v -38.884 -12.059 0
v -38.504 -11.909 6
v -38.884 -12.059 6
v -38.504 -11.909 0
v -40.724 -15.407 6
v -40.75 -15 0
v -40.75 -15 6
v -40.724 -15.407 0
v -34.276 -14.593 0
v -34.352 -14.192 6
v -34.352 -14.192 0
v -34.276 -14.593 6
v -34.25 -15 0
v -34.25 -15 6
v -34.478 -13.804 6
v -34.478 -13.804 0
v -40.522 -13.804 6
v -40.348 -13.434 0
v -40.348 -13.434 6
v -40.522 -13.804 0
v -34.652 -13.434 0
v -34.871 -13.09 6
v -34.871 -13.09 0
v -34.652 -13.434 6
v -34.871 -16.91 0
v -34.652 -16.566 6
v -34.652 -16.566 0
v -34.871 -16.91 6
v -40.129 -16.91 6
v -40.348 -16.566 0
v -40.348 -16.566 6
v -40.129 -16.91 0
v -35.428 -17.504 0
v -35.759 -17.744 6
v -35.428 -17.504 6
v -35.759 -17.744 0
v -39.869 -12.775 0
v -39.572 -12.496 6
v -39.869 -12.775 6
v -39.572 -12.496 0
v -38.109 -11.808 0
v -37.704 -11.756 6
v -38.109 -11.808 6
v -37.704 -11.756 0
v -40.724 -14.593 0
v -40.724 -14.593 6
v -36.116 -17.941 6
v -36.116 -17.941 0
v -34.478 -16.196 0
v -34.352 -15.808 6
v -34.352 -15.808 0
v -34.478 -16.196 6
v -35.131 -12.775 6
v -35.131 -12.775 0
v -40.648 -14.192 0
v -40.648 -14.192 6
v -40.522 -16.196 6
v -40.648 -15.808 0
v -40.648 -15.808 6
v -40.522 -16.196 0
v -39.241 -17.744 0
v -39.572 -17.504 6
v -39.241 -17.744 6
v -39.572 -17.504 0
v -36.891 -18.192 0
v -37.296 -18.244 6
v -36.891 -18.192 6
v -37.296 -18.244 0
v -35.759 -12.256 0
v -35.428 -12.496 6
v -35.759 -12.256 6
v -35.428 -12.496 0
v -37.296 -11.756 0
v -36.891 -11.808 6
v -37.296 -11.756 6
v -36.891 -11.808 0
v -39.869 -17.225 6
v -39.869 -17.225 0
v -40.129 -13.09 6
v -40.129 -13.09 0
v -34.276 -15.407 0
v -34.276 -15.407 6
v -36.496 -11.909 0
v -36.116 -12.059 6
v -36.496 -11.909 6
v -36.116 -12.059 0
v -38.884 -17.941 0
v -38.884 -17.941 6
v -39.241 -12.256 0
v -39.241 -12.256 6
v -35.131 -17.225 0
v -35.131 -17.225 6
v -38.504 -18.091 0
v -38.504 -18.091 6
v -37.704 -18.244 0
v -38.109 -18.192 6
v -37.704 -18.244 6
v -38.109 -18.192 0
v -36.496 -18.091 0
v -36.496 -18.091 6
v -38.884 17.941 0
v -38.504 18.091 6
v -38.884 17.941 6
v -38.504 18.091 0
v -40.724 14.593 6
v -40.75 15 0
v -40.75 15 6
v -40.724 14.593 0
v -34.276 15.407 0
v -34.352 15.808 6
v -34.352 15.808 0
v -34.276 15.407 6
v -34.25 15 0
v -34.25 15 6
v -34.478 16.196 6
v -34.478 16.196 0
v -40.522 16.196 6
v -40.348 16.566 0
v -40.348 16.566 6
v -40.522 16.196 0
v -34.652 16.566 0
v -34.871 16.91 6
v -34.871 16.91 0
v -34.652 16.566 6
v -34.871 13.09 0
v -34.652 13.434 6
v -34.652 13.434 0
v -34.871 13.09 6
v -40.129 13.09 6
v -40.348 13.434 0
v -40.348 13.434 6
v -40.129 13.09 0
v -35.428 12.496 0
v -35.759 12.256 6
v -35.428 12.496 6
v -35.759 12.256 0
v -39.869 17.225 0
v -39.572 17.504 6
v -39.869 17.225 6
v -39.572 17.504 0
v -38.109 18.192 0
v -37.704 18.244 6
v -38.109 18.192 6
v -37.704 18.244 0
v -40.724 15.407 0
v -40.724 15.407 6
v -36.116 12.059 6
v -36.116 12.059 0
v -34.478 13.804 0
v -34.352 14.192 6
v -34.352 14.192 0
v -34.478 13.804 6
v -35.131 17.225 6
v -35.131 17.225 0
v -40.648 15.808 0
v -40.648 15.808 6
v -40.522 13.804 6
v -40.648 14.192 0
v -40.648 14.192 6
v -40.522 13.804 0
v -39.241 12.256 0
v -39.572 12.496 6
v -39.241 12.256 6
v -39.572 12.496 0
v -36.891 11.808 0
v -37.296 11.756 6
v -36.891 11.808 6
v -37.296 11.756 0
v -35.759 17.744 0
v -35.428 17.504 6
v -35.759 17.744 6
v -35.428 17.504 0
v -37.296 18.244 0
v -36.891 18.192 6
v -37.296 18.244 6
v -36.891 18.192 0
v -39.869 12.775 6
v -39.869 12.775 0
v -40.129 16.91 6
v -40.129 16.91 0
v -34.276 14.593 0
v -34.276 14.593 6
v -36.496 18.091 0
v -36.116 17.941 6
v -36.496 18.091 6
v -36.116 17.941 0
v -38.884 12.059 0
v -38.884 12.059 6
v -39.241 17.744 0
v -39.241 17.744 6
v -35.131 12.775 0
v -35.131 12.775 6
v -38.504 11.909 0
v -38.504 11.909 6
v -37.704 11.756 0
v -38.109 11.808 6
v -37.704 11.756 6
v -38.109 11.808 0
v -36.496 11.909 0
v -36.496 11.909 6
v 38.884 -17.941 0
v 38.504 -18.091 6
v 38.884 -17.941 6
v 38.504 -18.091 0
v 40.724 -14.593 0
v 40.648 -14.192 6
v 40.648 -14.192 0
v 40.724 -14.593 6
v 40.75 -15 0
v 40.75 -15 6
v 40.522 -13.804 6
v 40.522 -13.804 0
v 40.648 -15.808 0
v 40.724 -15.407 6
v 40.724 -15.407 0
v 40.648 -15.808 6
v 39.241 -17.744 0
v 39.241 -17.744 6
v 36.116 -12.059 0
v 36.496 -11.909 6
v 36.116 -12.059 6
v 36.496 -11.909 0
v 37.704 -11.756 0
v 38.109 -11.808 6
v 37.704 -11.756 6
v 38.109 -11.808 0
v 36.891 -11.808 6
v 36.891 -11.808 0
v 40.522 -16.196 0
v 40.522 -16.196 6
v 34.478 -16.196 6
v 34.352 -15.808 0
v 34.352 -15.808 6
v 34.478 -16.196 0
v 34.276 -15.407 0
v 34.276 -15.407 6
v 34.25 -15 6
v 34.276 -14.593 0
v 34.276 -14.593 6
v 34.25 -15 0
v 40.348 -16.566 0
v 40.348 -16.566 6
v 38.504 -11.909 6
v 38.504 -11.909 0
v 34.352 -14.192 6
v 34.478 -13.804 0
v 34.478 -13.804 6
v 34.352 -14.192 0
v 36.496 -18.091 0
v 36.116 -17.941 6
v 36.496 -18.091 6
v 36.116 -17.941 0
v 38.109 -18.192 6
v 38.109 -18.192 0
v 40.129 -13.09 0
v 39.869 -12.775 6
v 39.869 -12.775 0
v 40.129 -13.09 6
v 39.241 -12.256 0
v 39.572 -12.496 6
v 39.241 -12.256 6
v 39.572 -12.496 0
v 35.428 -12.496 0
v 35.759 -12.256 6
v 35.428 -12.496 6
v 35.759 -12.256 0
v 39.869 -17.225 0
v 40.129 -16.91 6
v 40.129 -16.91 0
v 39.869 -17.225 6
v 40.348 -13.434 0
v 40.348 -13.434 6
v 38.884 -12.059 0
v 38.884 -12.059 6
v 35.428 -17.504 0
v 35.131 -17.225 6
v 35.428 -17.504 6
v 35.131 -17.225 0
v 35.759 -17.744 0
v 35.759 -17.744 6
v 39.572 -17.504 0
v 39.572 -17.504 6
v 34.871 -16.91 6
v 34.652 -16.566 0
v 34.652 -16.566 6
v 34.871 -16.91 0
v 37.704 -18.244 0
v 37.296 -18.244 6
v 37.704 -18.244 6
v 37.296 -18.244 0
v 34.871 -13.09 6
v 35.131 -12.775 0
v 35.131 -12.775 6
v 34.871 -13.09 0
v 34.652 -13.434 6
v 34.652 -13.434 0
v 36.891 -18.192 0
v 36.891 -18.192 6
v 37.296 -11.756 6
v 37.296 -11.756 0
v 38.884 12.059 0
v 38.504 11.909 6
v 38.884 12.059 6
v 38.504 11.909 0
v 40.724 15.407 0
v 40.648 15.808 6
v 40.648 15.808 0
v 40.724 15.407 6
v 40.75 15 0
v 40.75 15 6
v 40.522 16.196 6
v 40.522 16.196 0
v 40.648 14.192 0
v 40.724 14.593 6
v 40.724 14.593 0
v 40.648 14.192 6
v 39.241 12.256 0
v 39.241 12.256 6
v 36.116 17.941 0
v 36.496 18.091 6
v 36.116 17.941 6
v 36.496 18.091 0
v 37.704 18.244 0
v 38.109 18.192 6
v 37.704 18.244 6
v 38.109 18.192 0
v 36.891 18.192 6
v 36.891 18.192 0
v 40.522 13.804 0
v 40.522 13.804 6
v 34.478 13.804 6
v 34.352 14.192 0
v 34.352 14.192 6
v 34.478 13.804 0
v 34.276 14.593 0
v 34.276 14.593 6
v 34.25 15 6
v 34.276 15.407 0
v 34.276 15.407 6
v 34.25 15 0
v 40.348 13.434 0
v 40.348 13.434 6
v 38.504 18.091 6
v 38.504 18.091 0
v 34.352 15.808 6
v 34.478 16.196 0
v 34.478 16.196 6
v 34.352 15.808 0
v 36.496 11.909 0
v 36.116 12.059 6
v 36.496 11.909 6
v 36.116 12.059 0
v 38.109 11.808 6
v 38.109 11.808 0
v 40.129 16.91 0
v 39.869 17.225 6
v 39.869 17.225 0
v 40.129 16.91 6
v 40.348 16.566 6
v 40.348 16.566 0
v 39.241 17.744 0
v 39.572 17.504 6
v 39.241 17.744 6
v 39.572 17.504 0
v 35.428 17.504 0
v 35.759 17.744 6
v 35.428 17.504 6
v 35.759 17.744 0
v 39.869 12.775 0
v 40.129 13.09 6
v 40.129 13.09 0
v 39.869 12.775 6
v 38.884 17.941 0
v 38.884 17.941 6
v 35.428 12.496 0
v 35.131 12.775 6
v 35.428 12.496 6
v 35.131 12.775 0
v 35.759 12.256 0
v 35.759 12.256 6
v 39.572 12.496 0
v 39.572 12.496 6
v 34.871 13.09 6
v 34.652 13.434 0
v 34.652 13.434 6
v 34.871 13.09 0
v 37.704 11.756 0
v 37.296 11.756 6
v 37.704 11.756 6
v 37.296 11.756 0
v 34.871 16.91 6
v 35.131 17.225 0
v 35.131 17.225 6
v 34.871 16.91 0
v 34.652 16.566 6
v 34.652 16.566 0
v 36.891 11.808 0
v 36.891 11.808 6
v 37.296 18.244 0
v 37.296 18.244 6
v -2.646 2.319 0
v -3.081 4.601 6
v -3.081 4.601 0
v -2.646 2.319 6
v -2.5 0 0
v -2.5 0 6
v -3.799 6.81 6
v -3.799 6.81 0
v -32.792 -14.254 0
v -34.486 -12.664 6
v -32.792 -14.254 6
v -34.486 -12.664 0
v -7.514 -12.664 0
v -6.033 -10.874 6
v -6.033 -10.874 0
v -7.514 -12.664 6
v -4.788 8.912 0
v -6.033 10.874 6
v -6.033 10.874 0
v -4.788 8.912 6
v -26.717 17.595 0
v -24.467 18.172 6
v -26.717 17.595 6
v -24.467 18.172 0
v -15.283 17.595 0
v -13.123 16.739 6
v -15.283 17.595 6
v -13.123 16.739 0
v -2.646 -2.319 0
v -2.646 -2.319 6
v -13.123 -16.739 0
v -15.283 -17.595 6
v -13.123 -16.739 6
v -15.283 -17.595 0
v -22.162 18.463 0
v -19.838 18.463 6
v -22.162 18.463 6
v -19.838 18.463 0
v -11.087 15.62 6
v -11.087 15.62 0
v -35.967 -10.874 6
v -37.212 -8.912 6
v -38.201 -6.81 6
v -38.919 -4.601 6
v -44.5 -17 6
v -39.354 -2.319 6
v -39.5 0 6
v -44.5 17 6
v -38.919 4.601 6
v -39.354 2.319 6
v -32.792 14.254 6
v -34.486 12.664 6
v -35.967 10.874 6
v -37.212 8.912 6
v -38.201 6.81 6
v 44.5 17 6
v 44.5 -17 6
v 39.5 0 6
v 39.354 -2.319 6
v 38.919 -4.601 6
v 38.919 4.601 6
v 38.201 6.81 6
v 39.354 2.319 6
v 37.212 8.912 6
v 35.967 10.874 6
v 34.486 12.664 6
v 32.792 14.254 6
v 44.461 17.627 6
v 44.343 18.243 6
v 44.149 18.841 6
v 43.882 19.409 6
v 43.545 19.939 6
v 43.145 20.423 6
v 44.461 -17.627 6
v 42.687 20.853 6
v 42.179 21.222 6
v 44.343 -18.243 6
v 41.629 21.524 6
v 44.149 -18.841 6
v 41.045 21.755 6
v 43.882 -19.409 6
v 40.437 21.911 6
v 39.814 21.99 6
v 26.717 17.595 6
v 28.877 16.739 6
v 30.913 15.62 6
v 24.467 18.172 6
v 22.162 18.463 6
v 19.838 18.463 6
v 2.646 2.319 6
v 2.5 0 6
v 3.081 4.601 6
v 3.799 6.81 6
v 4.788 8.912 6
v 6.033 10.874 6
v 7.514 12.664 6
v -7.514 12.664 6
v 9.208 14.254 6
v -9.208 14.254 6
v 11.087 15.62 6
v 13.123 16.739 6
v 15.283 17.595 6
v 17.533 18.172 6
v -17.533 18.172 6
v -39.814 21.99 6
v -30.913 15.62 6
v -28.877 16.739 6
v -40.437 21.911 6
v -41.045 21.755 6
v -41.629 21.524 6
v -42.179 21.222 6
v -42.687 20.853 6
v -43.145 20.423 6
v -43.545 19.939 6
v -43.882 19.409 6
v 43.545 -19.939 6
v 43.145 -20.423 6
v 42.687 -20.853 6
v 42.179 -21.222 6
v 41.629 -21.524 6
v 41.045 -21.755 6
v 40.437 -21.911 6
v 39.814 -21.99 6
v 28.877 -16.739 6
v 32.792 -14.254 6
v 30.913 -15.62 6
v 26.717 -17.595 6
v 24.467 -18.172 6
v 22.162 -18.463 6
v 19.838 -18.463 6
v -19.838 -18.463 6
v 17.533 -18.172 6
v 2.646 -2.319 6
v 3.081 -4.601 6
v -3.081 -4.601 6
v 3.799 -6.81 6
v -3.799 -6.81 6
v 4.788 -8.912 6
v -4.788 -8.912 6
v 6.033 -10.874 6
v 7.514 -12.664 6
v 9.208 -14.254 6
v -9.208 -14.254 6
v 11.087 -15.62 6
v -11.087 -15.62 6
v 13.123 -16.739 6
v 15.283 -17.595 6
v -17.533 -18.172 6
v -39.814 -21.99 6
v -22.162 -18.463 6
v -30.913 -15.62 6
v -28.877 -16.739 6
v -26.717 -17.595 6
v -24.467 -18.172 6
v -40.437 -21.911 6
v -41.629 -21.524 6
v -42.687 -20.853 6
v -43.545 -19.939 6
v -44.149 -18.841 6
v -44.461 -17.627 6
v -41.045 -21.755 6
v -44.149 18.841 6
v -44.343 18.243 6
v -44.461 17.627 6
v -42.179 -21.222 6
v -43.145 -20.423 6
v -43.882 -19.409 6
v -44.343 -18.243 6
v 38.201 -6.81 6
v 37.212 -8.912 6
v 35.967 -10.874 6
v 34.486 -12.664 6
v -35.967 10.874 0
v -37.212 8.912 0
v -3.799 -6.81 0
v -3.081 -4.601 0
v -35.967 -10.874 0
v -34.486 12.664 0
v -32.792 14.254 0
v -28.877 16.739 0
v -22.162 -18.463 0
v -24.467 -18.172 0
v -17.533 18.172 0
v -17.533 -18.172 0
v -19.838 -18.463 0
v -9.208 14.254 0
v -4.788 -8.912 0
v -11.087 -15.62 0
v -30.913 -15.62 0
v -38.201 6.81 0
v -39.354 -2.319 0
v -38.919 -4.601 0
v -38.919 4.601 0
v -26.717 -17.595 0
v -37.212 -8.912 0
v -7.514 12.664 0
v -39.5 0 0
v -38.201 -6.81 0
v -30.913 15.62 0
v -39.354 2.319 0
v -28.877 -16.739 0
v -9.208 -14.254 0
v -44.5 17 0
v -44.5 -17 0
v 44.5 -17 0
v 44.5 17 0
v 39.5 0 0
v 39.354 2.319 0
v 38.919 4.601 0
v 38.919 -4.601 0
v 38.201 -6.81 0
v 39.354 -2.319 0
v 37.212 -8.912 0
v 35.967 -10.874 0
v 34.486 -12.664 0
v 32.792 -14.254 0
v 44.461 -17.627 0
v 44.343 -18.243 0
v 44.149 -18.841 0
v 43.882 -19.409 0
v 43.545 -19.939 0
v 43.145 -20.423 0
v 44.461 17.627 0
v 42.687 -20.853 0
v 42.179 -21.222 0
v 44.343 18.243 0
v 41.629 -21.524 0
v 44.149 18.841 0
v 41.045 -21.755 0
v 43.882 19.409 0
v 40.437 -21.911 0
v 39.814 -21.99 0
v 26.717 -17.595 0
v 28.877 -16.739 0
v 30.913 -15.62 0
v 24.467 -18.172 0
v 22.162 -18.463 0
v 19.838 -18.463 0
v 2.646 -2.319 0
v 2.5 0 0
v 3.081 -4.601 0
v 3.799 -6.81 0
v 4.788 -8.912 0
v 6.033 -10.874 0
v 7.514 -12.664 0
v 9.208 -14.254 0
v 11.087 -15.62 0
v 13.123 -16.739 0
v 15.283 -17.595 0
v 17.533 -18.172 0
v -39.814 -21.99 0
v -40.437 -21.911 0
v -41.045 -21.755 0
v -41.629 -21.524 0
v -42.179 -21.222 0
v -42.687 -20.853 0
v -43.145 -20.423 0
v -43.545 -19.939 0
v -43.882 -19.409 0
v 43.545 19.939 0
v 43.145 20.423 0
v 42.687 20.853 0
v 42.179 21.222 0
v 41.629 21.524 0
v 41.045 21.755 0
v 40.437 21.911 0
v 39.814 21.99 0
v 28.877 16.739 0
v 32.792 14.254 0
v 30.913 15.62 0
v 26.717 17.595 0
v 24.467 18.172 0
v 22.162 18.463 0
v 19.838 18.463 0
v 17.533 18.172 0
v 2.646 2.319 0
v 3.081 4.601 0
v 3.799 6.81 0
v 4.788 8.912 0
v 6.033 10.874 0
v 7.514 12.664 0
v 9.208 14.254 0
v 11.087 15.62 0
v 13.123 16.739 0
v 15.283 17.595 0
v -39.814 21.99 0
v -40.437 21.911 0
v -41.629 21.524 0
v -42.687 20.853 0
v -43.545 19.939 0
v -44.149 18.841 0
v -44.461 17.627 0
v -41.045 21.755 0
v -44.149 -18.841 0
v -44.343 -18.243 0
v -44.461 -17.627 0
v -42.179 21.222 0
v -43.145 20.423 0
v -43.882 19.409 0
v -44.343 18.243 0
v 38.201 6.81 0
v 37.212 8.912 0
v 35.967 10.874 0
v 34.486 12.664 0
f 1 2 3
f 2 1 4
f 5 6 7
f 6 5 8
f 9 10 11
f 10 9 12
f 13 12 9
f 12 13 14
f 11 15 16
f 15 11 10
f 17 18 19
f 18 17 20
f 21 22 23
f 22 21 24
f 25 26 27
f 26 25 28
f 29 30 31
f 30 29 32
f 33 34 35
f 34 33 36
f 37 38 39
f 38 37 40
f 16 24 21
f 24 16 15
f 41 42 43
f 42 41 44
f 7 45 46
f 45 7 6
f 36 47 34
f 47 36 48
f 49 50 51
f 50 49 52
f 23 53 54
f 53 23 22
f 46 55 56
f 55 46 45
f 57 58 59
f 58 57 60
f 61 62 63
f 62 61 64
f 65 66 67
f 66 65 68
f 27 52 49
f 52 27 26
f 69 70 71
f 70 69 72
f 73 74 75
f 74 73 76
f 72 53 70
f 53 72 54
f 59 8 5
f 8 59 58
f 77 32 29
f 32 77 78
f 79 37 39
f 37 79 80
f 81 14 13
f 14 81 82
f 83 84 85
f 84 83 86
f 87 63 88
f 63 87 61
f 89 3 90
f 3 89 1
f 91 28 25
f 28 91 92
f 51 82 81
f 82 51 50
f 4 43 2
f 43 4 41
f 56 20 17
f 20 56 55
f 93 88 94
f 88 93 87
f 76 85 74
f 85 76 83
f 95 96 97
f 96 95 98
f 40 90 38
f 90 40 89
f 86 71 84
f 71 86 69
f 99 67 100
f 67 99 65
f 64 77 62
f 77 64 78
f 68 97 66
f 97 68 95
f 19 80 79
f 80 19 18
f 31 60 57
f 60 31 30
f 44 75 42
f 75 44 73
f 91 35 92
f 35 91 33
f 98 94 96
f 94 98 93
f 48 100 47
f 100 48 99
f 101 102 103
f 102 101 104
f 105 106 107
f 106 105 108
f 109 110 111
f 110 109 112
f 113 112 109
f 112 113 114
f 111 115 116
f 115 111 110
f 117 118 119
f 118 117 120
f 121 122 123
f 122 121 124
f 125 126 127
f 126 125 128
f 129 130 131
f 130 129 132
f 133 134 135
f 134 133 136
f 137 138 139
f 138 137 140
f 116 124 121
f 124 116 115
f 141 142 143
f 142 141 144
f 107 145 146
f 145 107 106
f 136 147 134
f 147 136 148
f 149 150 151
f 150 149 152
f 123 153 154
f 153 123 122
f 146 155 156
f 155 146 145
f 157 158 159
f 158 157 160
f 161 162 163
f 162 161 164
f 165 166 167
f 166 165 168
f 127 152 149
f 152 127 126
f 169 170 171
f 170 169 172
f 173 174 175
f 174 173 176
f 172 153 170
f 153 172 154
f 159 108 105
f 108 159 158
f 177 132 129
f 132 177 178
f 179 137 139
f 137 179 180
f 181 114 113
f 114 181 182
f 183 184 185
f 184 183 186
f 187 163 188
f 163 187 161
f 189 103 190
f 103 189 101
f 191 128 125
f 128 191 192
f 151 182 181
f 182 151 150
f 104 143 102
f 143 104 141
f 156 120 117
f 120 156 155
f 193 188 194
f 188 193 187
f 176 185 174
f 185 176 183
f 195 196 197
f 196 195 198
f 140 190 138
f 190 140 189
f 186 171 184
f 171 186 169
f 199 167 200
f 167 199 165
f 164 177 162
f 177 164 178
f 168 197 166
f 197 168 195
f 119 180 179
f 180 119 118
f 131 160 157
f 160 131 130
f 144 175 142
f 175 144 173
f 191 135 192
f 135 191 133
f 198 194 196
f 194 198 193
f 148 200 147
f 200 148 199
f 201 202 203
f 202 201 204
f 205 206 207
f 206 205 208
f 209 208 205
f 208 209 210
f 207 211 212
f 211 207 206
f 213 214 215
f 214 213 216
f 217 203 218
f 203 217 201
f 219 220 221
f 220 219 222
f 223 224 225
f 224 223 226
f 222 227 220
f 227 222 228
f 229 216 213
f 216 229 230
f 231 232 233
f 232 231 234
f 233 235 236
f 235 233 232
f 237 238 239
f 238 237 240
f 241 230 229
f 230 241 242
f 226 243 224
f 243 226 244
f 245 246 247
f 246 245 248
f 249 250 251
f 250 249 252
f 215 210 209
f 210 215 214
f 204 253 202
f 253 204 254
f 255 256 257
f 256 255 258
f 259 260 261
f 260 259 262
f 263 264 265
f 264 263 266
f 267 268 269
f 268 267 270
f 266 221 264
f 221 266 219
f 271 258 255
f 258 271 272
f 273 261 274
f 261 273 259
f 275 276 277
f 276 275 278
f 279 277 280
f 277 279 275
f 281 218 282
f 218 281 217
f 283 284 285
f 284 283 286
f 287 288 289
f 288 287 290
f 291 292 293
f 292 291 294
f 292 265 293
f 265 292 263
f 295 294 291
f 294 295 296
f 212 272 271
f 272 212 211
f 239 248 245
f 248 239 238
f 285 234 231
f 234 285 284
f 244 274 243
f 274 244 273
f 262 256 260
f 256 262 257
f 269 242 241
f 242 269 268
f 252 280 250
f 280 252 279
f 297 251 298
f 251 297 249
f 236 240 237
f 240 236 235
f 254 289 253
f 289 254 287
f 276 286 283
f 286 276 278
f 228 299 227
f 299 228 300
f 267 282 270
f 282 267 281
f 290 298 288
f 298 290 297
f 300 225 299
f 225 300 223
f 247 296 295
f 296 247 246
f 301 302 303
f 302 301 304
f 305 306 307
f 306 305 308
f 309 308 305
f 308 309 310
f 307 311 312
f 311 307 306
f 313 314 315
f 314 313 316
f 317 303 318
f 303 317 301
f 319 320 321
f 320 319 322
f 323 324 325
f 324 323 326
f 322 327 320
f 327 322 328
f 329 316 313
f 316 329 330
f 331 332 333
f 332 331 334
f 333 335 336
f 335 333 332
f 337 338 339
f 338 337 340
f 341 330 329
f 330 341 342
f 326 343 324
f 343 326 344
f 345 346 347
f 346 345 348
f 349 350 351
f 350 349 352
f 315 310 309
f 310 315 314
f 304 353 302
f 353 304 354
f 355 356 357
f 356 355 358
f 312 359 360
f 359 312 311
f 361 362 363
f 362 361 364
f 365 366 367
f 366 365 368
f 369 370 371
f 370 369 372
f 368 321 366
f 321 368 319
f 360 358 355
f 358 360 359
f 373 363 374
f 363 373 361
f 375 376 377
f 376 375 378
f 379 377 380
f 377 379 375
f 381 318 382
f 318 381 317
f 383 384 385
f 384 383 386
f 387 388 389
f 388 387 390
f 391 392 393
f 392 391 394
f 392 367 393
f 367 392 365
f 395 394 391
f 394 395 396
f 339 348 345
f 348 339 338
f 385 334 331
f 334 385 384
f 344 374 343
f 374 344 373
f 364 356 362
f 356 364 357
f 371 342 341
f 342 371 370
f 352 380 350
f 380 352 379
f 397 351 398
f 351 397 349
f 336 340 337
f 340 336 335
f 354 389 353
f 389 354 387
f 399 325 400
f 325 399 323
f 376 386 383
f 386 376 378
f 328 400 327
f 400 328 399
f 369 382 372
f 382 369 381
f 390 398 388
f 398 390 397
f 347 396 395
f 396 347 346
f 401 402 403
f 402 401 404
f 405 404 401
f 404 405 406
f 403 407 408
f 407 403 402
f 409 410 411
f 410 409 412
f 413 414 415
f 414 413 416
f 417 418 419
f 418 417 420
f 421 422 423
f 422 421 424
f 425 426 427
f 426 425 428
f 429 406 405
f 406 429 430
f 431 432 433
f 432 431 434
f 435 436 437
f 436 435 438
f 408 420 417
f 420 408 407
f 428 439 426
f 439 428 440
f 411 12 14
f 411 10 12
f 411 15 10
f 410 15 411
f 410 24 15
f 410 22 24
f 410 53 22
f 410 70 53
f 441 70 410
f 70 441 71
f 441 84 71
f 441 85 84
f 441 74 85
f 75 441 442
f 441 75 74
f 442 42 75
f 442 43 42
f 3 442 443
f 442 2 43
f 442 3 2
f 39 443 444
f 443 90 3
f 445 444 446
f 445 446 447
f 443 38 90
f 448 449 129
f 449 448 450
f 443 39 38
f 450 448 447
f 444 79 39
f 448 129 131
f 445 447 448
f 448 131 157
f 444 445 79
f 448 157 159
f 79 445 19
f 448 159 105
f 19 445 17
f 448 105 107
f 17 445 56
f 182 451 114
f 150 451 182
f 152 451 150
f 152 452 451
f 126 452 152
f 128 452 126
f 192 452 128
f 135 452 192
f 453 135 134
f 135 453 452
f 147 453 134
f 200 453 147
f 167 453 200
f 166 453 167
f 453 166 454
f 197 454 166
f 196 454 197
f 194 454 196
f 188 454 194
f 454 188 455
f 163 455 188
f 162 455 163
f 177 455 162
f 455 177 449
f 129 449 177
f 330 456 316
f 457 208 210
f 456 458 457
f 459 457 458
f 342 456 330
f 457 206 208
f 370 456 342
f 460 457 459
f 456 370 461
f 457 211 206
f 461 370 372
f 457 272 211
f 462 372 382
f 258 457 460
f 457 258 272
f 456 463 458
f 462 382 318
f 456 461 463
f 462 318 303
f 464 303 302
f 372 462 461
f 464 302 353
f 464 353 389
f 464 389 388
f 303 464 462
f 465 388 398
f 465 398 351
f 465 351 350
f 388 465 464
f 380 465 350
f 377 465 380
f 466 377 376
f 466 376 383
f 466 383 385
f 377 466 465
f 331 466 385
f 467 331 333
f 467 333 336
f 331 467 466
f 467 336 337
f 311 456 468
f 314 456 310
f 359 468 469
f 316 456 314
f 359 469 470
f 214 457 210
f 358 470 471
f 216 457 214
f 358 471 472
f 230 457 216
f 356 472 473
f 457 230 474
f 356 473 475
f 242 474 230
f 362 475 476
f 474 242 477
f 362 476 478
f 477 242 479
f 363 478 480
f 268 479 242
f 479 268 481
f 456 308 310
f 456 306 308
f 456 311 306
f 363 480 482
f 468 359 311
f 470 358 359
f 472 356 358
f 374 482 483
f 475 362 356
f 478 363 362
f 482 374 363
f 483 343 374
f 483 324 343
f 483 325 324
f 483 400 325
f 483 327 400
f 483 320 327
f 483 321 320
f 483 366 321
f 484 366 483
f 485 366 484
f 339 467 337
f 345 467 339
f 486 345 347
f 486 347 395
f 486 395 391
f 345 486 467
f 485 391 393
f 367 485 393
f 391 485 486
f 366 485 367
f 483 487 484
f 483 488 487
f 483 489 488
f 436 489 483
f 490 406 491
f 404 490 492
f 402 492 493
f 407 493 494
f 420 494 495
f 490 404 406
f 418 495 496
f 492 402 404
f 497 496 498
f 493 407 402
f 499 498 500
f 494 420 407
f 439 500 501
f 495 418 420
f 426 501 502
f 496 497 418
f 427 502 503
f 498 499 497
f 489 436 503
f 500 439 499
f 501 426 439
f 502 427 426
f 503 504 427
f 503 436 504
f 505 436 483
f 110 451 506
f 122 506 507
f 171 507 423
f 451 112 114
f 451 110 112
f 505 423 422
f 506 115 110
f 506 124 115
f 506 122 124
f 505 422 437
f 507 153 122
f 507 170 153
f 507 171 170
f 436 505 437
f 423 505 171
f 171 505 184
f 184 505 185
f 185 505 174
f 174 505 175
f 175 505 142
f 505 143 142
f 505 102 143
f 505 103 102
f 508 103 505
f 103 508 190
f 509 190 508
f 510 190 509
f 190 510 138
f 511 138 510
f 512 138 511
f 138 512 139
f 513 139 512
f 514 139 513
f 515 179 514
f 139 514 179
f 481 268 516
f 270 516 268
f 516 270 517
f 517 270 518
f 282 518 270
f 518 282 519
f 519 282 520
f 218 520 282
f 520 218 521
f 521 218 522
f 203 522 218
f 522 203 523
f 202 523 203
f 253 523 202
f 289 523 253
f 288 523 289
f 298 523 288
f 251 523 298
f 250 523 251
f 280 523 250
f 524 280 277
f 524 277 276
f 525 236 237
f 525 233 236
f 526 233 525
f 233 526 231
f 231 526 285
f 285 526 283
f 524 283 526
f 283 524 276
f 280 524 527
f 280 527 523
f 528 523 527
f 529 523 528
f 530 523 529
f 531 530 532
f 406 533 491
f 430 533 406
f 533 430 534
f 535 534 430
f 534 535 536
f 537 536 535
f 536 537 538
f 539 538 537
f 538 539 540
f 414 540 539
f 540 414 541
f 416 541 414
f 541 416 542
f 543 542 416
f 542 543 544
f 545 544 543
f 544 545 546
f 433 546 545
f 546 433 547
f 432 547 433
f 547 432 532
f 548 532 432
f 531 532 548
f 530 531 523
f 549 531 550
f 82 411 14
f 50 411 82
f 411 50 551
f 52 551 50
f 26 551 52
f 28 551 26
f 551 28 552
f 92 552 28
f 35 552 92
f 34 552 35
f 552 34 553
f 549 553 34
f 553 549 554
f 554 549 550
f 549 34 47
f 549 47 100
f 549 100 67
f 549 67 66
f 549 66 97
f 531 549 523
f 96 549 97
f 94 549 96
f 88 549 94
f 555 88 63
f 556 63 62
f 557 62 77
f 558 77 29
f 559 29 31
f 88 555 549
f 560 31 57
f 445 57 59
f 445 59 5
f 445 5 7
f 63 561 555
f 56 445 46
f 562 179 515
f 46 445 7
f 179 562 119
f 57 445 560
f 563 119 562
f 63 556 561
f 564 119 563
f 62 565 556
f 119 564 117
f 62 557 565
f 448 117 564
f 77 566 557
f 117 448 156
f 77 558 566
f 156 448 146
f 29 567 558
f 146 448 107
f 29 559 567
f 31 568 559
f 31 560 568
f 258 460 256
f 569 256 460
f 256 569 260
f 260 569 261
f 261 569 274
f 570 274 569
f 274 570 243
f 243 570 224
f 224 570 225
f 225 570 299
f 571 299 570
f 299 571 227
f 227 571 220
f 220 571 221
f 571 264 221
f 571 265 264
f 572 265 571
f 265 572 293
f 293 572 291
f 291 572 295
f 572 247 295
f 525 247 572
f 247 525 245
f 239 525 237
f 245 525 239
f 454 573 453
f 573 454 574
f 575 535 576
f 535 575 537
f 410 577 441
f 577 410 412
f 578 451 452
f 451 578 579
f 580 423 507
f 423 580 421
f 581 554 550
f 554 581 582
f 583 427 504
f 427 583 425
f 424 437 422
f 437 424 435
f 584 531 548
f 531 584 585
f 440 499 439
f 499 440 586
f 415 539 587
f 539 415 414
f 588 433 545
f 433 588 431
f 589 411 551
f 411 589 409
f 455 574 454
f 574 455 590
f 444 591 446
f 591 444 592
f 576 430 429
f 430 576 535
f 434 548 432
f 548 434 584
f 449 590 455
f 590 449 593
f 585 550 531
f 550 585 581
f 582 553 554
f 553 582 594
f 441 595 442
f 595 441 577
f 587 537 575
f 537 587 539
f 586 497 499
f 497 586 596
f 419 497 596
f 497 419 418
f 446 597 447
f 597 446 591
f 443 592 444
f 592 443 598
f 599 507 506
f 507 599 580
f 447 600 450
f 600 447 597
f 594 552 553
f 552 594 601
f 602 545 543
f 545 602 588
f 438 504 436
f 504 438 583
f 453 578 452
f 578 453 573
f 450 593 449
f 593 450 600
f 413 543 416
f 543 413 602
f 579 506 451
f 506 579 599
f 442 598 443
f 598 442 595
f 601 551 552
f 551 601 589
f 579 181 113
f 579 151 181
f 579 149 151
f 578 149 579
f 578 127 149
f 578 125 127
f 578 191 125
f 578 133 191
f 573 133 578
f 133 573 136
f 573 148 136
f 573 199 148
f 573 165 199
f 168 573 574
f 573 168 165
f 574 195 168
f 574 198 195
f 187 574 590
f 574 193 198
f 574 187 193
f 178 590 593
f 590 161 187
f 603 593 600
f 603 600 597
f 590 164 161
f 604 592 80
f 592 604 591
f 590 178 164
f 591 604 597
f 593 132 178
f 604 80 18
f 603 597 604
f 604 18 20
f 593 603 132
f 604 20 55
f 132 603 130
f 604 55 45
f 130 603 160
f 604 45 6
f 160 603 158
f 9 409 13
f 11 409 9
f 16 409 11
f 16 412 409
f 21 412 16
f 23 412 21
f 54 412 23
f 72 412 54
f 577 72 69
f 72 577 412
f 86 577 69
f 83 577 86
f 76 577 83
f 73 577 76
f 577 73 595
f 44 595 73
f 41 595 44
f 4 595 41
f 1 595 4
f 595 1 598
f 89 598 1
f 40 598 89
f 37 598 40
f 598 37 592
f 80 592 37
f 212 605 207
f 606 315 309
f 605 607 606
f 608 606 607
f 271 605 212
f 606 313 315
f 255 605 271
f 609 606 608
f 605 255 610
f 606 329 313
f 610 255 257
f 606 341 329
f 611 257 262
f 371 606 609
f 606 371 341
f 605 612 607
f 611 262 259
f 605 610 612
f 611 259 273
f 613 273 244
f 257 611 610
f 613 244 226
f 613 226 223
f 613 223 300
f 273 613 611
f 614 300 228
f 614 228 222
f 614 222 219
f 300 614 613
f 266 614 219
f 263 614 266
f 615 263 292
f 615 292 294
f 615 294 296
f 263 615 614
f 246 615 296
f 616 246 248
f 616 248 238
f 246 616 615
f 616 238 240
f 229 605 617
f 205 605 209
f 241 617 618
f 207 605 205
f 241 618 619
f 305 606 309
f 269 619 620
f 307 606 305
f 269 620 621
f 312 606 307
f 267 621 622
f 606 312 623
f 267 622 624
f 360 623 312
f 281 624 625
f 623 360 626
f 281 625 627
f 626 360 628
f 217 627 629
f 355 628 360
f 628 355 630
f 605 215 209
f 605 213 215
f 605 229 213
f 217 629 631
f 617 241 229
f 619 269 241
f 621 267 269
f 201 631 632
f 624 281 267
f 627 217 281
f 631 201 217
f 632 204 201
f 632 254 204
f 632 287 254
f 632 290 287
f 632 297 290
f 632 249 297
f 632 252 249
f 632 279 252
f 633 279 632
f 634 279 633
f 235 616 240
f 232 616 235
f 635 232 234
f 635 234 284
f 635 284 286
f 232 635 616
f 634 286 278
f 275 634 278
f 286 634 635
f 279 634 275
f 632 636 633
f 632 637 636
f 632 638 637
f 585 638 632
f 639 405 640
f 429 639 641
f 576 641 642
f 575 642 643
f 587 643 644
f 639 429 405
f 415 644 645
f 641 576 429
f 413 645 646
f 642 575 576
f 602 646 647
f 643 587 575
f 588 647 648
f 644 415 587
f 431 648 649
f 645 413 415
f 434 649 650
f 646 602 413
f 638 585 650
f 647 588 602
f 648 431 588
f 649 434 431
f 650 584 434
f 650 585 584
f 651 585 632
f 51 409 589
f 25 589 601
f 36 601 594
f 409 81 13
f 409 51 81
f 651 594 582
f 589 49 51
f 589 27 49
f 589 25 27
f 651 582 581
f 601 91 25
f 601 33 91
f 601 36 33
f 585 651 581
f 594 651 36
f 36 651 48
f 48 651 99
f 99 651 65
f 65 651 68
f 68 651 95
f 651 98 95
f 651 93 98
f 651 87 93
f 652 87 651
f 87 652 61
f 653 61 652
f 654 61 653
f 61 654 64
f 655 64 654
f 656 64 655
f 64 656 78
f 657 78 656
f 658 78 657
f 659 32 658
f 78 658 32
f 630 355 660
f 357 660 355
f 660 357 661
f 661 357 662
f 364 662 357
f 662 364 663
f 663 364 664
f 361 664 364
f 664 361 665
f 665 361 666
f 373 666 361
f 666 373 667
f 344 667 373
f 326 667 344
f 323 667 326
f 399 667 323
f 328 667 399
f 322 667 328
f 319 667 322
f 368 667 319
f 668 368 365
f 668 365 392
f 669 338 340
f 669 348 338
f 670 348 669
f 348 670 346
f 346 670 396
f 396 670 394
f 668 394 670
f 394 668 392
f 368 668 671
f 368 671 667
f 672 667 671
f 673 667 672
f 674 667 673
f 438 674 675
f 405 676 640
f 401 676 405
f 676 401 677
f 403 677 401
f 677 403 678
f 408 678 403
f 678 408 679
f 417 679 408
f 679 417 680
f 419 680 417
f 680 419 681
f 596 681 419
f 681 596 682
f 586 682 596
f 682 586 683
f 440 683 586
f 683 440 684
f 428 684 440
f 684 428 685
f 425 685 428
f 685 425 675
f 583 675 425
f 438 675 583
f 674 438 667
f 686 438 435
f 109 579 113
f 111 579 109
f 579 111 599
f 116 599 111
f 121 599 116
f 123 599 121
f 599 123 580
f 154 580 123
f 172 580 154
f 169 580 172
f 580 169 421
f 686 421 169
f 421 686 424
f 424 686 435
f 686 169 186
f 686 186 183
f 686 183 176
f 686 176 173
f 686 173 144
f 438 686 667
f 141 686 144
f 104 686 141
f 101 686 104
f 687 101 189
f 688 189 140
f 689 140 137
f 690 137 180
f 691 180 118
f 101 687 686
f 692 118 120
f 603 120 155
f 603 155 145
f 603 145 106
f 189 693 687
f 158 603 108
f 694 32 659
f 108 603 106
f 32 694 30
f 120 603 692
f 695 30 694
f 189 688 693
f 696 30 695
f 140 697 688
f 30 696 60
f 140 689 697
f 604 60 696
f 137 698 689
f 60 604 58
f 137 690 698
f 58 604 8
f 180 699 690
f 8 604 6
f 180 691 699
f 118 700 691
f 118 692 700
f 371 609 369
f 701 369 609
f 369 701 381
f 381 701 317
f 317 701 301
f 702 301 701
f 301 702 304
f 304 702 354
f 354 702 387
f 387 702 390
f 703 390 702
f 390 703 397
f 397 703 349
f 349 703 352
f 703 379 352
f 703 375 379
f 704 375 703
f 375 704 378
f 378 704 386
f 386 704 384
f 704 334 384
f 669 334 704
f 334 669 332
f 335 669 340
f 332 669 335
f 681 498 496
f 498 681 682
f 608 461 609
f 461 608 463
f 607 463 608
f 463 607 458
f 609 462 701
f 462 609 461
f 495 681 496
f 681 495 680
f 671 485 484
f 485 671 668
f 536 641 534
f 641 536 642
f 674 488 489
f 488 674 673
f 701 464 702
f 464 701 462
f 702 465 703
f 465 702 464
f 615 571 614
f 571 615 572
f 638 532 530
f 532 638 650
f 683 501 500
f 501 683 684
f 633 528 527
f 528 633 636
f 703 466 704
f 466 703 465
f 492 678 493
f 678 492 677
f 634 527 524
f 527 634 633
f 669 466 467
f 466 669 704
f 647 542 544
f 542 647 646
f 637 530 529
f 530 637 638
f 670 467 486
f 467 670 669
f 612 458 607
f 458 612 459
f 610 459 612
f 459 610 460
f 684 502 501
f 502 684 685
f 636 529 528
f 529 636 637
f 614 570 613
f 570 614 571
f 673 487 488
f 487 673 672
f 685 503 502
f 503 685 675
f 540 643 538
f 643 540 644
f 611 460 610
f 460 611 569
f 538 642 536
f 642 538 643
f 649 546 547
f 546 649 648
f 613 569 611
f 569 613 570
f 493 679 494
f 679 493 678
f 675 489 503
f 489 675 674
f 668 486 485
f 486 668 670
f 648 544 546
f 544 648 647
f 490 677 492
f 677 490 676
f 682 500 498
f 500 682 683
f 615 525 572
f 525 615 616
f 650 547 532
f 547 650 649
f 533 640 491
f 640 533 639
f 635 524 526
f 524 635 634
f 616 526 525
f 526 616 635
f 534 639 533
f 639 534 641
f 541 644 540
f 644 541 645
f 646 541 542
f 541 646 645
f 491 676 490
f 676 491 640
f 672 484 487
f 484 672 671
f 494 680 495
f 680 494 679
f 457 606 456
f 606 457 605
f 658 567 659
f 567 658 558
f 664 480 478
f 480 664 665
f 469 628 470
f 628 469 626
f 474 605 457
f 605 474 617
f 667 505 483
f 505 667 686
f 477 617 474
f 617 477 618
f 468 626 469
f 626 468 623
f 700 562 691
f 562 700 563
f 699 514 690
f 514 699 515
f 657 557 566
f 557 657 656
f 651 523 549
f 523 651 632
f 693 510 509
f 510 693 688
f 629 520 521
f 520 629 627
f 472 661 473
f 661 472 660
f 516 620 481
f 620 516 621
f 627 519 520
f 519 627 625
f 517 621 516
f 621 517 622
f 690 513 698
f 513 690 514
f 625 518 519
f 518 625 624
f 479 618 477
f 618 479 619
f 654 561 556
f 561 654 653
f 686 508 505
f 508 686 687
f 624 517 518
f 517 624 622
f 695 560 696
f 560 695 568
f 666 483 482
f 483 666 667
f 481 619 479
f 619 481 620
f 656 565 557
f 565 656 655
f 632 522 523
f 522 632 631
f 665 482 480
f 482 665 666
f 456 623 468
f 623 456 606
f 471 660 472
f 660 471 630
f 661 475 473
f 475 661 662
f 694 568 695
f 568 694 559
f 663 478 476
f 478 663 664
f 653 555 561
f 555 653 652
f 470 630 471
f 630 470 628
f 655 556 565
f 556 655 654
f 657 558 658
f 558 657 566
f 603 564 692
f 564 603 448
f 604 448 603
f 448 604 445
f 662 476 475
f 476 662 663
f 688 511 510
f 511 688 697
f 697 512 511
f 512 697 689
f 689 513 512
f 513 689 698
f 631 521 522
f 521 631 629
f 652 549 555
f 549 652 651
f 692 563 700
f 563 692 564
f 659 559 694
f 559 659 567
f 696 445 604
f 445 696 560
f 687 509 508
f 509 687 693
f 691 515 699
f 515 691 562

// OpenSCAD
$fn = 50;


difference() {
	union() {
		hull() {
			translate(v = [-39.5000000000, 17.0000000000, 0]) {
				cylinder(h = 6, r = 5);
			}
			translate(v = [39.5000000000, 17.0000000000, 0]) {
				cylinder(h = 6, r = 5);
			}
			translate(v = [-39.5000000000, -17.0000000000, 0]) {
				cylinder(h = 6, r = 5);
			}
			translate(v = [39.5000000000, -17.0000000000, 0]) {
				cylinder(h = 6, r = 5);
			}
		}
	}
	union() {
		#translate(v = [-37.5000000000, -15.0000000000, -100.0000000000]) {
			cylinder(h = 200, r = 3.2500000000);
		}
		#translate(v = [-37.5000000000, 15.0000000000, -100.0000000000]) {
			cylinder(h = 200, r = 3.2500000000);
		}
		#translate(v = [37.5000000000, -15.0000000000, -100.0000000000]) {
			cylinder(h = 200, r = 3.2500000000);
		}
		#translate(v = [37.5000000000, 15.0000000000, -100.0000000000]) {
			cylinder(h = 200, r = 3.2500000000);
		}
		#translate(v = [-21.0000000000, 0, 0]) {
			cylinder(h = 6, r = 18.5000000000);
		}
		#translate(v = [21.0000000000, 0, 0]) {
			cylinder(h = 6, r = 18.5000000000);
		}
	}
}
